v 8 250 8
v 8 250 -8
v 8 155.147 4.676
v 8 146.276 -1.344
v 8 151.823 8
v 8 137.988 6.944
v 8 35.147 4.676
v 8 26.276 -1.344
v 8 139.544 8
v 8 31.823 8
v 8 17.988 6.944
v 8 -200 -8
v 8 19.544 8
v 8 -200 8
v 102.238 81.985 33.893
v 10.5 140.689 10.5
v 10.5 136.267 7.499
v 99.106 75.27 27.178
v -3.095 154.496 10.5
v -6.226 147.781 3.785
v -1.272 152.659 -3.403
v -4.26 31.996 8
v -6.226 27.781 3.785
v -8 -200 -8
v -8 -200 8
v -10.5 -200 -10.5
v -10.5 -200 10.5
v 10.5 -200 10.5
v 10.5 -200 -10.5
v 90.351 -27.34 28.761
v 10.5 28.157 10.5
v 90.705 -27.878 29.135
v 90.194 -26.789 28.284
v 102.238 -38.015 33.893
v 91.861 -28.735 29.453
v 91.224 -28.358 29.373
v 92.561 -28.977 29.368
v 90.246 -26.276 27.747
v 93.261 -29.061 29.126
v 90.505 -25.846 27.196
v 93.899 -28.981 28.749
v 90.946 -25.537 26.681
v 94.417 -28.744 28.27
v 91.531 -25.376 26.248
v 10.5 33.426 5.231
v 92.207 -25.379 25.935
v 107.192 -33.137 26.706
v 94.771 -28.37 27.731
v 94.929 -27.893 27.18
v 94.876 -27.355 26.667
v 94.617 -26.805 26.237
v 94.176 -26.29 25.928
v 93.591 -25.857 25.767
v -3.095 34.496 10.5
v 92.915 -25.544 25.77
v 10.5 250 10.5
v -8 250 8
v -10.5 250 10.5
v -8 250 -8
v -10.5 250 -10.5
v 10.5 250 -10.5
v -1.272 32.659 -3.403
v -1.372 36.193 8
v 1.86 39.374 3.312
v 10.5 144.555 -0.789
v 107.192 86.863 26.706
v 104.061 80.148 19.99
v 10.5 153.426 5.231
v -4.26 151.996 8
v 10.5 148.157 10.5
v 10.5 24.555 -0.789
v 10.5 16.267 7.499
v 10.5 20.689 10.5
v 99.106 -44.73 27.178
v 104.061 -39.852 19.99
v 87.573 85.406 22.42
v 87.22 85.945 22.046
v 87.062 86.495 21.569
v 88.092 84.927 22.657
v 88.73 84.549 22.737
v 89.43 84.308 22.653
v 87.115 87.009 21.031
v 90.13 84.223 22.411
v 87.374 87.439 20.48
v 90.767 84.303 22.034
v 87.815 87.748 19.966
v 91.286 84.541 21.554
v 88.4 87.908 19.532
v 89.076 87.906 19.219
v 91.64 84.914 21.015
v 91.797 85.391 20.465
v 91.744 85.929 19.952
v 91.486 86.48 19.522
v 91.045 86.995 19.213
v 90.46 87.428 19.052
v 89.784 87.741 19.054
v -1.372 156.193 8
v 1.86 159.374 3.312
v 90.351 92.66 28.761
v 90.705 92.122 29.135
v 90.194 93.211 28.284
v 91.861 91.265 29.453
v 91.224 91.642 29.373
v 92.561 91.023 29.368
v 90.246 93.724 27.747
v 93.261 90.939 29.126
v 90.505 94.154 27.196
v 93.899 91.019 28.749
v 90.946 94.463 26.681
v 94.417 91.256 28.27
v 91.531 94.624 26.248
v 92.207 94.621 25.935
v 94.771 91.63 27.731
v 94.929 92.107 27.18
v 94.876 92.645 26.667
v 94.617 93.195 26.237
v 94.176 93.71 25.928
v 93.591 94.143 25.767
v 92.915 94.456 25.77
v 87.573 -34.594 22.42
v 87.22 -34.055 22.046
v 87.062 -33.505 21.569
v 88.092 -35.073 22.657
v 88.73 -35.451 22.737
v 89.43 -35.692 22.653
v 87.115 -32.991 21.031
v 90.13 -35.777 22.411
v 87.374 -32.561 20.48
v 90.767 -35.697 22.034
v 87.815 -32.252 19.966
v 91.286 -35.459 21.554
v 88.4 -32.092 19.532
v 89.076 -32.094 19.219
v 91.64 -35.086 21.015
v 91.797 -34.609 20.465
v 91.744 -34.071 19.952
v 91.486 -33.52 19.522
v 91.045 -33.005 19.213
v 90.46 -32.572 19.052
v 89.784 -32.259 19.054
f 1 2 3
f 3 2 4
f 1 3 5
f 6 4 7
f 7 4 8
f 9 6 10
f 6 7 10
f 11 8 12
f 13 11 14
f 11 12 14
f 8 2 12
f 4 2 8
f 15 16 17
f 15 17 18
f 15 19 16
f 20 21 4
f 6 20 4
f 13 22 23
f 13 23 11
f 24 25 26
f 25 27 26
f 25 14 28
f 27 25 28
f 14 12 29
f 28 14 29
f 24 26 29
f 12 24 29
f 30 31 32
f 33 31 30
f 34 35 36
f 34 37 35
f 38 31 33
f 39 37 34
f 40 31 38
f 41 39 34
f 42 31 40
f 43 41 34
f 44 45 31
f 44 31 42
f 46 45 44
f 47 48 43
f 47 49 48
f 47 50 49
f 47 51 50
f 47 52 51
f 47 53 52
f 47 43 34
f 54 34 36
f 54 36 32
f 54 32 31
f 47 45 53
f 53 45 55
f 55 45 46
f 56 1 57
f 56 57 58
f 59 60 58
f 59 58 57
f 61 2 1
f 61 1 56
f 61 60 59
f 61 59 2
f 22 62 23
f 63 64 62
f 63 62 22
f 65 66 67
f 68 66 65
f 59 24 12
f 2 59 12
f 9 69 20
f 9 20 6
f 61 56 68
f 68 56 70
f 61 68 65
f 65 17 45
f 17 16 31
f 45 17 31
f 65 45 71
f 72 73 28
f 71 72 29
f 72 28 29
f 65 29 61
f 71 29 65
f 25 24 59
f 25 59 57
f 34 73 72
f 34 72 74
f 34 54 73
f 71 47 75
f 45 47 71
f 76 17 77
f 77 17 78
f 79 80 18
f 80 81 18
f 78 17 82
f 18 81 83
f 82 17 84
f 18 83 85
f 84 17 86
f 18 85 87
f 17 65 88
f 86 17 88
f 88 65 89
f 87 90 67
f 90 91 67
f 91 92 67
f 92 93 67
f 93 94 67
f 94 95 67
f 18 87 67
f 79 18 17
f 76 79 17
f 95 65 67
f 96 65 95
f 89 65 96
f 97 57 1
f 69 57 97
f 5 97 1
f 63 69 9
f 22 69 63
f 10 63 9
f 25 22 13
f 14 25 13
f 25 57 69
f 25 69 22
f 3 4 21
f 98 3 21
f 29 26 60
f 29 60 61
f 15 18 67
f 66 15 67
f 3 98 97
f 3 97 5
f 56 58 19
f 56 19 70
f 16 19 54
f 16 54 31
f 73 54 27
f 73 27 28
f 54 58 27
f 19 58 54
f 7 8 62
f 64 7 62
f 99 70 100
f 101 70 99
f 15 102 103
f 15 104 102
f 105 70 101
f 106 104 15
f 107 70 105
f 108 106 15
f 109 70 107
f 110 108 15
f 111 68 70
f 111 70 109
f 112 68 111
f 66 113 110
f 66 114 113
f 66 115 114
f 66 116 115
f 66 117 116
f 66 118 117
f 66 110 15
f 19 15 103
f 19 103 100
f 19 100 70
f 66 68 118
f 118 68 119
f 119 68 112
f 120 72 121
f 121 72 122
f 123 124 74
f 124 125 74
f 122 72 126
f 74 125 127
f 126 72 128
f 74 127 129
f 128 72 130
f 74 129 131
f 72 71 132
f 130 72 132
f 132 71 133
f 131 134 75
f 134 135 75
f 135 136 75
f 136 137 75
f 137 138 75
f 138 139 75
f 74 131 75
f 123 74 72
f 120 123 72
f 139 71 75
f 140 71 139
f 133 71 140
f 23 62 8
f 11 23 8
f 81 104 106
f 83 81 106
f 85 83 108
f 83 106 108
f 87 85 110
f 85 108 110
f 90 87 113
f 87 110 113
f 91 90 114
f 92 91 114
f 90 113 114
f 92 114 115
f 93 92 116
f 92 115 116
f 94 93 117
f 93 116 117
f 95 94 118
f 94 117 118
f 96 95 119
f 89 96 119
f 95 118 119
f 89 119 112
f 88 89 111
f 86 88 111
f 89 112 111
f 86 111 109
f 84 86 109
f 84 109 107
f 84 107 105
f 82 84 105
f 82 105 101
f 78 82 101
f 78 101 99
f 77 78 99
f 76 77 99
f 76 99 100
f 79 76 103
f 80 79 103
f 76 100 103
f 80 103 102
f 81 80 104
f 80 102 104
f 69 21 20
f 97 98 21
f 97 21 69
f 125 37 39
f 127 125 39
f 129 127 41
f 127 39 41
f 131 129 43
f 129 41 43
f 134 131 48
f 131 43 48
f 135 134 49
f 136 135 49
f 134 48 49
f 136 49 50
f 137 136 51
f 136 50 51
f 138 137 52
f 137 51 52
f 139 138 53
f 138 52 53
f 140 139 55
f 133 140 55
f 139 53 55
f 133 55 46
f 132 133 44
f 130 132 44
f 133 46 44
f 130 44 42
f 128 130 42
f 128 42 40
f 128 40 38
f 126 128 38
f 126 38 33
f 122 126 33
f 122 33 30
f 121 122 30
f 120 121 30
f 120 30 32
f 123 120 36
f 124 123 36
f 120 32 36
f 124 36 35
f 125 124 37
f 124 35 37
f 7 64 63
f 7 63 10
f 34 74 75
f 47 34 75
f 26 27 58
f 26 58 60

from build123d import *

# Parameters (mm, degrees)
BOSS_EXTRUDE1_DEPTH      = 250
BOSS_EXTRUDE1_DEPTH_BACK = 200
SKETCH2_W                = 21
SKETCH2_H                = 21
SKETCH3_W                = 16
SKETCH3_H                = 16
CUT_EXTRUDE1_DEPTH       = 800
SKETCH14_R               = 2.5
BOSS_EXTRUDE3_DEPTH      = 10
LPATTERN1_COUNT          = 2
LPATTERN1_PITCH          = 120


with BuildPart() as part:
    # Sketch2 → Boss-Extrude1 (new, two sides: drawn at the far end of the back side and taken through both)
    with BuildSketch(Plane(origin=(0, 0, 0), x_dir=(1, 0, 0), z_dir=(0, 1, 0)).offset(-BOSS_EXTRUDE1_DEPTH_BACK)):
        Rectangle(SKETCH2_W, SKETCH2_H)
    extrude(amount=BOSS_EXTRUDE1_DEPTH + BOSS_EXTRUDE1_DEPTH_BACK)

    # Sketch3 → Cut-Extrude1 (cut)
    with BuildSketch(Plane.XZ.offset(200)):
        Rectangle(SKETCH3_W, SKETCH3_H)
    extrude(amount=-CUT_EXTRUDE1_DEPTH, mode=Mode.SUBTRACT)

    # Sketch14 → Boss-Extrude3 (add)
    with BuildSketch(Plane(origin=(9.15884387, 19.641204062, 19.641204062), x_dir=(0.9497051253149476, -0.22142738646170096, -0.2214273864617029), z_dir=(0.3131456130149675, 0.6715429342378182, 0.6715429342378204))):
        Polygon((-12.902384486, 16.967939861), (98.008310235, -50.846644091), (103.224816692, -42.31505219), (-7.685878028, 25.499531762), align=None)
        with Locations(Location((87.819175611, -38.756088454, 0), (0, 0, 270))):
            Circle(SKETCH14_R, mode=Mode.SUBTRACT)
    boss_extrude3 = extrude(amount=-BOSS_EXTRUDE3_DEPTH)

    # LPattern1: Boss-Extrude3 ×2
    with Locations(*[(0, i * LPATTERN1_PITCH, 0) for i in range(1, LPATTERN1_COUNT)]):
        add(boss_extrude3)


solid = part.part
